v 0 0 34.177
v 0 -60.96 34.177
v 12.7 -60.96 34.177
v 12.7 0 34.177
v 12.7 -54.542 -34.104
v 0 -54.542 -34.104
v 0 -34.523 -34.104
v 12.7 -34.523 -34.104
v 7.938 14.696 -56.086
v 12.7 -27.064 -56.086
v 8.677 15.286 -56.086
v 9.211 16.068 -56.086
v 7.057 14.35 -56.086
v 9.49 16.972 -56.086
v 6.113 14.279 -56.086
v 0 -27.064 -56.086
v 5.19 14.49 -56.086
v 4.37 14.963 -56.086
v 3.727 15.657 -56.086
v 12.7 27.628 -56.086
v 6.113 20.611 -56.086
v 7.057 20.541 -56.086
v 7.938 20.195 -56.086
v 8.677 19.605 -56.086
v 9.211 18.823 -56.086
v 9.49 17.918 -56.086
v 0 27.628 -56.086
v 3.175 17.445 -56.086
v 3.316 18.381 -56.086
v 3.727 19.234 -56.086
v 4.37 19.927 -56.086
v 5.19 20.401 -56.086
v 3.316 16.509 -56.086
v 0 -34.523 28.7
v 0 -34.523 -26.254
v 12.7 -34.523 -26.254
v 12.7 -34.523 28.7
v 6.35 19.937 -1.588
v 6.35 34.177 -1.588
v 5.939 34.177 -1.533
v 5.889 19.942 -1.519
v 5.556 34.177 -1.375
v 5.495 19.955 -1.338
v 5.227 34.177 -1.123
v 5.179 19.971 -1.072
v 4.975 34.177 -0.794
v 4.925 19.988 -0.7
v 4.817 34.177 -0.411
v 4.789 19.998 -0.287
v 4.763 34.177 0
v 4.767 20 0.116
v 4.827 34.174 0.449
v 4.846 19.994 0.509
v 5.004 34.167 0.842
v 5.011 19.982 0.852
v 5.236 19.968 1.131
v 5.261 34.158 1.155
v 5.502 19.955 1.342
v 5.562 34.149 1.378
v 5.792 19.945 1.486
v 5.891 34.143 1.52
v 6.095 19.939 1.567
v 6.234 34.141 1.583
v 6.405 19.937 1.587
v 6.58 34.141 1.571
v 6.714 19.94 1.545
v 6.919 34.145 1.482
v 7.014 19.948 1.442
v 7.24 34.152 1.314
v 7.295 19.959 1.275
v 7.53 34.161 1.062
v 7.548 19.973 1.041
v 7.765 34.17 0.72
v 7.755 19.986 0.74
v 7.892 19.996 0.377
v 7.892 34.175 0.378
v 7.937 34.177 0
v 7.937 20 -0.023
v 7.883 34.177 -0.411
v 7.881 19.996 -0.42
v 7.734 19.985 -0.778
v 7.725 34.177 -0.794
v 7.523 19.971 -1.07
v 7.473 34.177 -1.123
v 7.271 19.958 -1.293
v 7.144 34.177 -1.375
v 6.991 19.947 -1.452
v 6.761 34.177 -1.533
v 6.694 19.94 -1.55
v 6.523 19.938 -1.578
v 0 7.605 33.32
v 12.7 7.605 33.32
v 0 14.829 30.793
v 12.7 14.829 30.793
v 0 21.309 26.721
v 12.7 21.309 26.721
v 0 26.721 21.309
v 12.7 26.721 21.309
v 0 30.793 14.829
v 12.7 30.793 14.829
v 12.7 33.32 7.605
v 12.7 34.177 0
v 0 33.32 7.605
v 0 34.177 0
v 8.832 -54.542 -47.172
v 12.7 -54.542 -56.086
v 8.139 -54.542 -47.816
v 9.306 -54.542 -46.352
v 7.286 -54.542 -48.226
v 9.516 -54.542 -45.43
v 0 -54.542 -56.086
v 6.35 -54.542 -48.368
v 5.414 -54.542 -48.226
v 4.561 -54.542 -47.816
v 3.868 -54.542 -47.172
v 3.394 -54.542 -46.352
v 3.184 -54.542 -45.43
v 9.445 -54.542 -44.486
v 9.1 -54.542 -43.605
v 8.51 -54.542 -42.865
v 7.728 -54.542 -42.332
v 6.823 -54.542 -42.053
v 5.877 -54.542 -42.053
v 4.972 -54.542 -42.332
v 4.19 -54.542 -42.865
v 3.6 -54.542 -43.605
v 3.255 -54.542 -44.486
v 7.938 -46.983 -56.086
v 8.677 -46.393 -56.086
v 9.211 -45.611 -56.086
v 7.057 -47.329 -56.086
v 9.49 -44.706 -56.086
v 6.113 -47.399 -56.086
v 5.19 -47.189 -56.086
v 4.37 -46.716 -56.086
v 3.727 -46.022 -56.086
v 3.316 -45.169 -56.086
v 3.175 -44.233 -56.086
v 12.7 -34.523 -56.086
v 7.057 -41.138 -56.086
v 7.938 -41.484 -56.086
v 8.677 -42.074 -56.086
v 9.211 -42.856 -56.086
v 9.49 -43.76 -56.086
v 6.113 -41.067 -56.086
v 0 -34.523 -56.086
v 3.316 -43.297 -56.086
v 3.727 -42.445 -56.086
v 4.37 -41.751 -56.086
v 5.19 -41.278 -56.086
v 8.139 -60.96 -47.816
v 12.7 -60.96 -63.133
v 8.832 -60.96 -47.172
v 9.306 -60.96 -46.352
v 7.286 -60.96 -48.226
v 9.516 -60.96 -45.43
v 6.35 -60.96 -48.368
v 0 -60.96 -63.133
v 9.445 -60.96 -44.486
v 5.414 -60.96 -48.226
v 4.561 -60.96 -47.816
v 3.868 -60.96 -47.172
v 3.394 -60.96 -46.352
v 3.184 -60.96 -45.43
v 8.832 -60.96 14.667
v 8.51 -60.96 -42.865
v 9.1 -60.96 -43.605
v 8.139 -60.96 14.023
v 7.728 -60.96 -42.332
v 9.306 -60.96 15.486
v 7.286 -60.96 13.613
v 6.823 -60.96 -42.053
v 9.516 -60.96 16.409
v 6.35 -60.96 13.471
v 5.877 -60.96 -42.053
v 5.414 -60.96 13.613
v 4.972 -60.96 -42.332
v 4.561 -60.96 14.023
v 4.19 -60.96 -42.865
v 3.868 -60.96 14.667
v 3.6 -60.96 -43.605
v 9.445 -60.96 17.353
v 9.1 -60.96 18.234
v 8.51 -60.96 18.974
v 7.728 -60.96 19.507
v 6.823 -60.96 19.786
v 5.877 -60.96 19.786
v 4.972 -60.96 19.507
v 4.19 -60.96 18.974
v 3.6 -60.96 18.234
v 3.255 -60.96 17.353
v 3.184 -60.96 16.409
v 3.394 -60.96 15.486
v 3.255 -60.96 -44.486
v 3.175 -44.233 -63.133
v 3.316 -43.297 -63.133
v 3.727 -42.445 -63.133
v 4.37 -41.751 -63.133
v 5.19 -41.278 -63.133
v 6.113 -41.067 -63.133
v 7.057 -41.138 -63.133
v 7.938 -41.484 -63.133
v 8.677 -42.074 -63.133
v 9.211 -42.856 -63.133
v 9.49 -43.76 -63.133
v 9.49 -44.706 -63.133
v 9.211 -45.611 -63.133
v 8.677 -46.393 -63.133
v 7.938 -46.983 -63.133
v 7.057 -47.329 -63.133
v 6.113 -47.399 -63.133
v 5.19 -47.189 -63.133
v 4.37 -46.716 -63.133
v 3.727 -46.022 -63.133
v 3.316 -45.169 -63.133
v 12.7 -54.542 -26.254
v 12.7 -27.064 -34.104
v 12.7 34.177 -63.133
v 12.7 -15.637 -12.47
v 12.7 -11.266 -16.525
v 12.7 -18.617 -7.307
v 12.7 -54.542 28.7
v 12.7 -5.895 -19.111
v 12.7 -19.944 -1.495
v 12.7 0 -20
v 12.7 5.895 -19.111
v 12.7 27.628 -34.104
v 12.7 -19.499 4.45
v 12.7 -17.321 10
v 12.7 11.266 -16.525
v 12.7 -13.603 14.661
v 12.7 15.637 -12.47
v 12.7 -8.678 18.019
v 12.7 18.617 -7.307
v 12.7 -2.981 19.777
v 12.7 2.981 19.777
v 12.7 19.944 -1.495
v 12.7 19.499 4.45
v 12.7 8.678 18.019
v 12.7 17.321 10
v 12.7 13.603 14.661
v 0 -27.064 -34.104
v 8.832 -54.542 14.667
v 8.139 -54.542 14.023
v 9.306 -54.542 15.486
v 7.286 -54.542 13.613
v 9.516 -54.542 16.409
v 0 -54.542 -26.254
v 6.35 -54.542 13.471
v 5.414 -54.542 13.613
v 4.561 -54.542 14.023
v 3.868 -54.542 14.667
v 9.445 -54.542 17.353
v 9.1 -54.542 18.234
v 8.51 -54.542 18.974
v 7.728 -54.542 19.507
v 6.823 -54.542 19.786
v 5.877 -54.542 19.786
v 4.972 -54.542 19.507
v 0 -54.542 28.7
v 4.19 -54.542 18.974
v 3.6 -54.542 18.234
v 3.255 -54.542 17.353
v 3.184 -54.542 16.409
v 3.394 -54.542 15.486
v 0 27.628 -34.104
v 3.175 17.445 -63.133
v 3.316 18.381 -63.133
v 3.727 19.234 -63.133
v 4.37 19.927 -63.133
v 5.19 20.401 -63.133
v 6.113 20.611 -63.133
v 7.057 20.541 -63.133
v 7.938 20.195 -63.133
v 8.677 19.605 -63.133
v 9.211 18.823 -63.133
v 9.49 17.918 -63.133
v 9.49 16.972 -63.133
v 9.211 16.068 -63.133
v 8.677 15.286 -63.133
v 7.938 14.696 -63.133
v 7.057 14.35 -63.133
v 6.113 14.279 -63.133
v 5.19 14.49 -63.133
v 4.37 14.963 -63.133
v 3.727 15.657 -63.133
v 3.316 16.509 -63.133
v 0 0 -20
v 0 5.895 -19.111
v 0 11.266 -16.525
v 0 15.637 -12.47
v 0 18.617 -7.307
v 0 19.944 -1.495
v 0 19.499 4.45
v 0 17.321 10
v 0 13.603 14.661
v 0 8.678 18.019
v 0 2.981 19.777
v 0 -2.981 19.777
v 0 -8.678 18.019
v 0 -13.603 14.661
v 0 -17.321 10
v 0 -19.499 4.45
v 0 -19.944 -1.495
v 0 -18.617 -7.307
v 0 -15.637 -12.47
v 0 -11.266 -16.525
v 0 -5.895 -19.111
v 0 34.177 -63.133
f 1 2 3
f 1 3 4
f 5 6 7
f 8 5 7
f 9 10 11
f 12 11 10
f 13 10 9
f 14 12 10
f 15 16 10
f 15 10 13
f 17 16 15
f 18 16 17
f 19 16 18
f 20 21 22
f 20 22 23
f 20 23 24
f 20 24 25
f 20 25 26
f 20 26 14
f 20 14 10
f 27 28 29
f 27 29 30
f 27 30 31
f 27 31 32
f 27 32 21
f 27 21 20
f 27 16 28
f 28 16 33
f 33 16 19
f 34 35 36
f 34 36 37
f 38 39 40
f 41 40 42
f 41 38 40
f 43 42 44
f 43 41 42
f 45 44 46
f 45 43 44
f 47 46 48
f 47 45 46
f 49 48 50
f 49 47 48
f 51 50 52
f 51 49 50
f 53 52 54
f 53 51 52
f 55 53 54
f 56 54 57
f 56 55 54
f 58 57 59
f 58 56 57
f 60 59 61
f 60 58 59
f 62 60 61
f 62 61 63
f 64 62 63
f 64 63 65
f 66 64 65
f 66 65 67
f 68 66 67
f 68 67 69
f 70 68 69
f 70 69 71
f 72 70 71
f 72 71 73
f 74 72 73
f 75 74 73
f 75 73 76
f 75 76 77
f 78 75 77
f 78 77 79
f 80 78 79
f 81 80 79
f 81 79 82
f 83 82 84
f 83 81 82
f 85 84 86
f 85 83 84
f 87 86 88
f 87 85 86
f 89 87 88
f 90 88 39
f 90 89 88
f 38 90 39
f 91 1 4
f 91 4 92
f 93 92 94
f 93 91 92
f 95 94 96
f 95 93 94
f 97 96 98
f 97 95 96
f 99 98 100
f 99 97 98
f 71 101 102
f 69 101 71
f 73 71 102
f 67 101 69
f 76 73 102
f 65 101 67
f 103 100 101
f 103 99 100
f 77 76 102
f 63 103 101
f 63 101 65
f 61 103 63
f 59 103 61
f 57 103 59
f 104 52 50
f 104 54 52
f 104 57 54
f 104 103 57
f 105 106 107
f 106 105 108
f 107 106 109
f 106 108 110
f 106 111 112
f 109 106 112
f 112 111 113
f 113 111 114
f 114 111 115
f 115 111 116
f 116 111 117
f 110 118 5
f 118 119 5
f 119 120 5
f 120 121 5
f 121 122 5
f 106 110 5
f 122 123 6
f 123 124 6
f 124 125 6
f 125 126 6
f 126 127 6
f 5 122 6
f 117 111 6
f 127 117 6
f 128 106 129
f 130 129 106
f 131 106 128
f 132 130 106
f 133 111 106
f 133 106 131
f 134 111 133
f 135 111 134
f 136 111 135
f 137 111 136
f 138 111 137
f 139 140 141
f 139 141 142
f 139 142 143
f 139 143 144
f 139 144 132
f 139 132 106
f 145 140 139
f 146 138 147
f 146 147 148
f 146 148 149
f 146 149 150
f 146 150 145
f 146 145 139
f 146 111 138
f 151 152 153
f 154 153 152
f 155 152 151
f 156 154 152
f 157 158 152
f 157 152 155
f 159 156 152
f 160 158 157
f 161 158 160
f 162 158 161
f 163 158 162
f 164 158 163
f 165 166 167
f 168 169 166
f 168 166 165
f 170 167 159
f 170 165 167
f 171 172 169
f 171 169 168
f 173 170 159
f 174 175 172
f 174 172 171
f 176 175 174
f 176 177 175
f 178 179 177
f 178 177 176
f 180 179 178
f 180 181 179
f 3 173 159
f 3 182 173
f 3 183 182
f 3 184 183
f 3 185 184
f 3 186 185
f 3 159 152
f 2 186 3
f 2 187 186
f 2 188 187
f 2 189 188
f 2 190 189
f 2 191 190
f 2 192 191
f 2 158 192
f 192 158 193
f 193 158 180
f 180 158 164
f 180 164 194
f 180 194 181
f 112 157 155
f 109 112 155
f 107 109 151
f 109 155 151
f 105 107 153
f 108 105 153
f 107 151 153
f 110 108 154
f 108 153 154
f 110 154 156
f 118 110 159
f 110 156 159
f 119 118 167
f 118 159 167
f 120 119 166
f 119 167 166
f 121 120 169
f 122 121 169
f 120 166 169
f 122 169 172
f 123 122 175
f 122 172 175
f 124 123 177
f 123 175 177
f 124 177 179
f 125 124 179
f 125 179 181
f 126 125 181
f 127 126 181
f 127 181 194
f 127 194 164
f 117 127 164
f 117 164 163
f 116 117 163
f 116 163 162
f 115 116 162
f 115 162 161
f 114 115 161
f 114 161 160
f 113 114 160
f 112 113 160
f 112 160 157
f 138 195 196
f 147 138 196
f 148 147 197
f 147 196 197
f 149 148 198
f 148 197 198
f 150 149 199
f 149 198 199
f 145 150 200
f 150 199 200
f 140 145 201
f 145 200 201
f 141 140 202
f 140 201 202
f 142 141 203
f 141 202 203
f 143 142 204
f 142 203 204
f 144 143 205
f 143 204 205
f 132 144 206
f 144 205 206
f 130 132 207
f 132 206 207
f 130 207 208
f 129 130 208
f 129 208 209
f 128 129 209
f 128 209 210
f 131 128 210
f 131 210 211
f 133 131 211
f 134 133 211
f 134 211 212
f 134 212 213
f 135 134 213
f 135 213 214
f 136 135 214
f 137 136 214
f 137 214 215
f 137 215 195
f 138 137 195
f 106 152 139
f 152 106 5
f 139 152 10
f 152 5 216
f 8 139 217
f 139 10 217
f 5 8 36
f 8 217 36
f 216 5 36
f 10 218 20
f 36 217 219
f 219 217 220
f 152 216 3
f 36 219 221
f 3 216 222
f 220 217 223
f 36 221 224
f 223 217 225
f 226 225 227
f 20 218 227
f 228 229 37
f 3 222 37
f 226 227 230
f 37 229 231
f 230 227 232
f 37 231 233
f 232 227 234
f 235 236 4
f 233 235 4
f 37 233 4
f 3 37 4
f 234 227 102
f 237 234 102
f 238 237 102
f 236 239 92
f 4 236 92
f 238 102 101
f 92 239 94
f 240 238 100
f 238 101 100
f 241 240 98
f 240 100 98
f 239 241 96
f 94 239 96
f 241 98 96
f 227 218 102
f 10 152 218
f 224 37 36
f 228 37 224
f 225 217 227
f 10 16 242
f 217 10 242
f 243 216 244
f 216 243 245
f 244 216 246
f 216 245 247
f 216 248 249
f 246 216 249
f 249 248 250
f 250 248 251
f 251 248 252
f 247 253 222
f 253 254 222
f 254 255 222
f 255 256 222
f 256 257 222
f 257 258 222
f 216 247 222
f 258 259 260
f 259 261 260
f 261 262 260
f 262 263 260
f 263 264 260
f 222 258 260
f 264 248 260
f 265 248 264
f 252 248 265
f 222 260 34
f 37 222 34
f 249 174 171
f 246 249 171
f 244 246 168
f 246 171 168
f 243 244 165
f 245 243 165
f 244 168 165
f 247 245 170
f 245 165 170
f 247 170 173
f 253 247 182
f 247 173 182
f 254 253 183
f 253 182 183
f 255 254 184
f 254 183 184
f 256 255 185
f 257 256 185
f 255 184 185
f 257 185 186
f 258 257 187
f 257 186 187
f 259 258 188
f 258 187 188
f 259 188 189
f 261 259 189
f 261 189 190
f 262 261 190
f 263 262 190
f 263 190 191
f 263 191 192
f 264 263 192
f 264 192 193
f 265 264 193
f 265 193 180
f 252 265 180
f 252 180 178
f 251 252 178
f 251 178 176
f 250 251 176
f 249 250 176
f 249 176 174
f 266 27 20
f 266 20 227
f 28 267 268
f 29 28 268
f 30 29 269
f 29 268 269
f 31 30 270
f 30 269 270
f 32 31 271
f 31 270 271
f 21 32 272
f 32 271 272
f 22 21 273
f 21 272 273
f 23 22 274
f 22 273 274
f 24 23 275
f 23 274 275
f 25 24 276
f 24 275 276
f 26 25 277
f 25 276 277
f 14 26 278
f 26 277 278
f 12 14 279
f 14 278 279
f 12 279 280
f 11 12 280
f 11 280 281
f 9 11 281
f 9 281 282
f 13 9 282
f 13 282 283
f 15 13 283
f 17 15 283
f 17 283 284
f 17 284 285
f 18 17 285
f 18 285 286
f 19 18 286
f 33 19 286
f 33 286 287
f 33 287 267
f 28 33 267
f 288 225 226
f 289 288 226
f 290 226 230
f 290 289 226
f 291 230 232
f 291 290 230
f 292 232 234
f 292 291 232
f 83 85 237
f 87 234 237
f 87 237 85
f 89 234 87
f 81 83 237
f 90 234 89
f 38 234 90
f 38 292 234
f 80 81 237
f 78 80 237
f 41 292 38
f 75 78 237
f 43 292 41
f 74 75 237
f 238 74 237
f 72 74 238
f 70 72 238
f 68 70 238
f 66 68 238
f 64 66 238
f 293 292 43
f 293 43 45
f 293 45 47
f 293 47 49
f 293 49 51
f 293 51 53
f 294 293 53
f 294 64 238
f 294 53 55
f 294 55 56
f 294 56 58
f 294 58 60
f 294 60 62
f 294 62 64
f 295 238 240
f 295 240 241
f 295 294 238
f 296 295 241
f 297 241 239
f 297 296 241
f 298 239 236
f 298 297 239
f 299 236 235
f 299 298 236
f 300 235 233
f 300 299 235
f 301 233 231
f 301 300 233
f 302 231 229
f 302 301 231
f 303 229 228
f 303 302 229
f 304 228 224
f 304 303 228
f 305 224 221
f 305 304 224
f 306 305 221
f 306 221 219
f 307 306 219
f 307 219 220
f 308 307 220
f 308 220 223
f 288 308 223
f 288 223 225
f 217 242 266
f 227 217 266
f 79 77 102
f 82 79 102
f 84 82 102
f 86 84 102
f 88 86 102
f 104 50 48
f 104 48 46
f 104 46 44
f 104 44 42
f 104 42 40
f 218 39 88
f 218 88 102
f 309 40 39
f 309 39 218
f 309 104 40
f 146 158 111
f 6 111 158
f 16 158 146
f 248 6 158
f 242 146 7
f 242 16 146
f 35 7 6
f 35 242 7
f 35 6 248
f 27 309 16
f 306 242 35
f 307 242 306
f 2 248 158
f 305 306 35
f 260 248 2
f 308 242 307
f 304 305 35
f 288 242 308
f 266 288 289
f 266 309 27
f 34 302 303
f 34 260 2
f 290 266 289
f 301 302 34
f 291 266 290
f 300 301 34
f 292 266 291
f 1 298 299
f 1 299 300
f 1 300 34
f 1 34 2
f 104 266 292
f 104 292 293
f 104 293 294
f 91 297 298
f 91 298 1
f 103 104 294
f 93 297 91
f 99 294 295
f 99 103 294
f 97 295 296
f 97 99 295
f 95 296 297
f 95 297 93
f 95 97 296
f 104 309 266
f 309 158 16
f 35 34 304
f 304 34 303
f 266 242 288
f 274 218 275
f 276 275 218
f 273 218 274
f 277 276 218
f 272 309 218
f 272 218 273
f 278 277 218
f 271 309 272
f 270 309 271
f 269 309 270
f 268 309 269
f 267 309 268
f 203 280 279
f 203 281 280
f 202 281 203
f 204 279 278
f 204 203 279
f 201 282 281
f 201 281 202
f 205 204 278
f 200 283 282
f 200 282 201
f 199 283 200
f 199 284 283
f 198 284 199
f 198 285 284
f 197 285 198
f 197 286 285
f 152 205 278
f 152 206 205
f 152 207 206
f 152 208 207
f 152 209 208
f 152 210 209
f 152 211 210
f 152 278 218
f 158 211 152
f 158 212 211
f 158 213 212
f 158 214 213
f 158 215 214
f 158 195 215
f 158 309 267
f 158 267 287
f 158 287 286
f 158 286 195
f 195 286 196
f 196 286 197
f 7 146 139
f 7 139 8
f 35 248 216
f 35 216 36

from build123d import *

# Parameters (mm, degrees)
SKETCH1_R           = 20
BOSS_EXTRUDE1_DEPTH = 12.7
SKETCH2_R           = 1.5875
CUT_EXTRUDE1_DEPTH  = 89.674827911
SKETCH3_W           = 21.981677087
SKETCH3_H           = 54.692506085
SKETCH3_W_2         = 54.954192717
SKETCH3_H_2         = 20.019027347
CUT_EXTRUDE2_DEPTH  = 70.866
SKETCH4_R           = 3.175
CUT_EXTRUDE3_DEPTH  = 13.462
SKETCH5_R           = 3.175
CUT_EXTRUDE4_DEPTH  = 13.462


with BuildPart() as part:
    # Sketch1 → Boss-Extrude1 (new body)
    with BuildSketch(Plane(origin=(0, 0, 0), x_dir=(0, 0, -1), z_dir=(1, 0, 0))):
        with BuildLine():
            Line((0, 34.177299494), (34.177299494, 34.177299494))
            Line((34.177299494, 34.177299494), (63.133299494, 34.177299494))
            Line((63.133299494, 34.177299494), (63.133299494, -60.96))
            Line((63.133299494, -60.96), (-34.177299494, -60.96))
            Line((-34.177299494, -60.96), (-34.177299494, 0))
            ThreePointArc((-34.177299494, 0), (-24.167000235, 24.167000235), (0, 34.177299494))
        make_face()
        Circle(SKETCH1_R, mode=Mode.SUBTRACT)
    extrude(amount=BOSS_EXTRUDE1_DEPTH)

    # Sketch2 → Cut-Extrude1 (cut, through all)
    with BuildSketch(Plane(origin=(0, 0, 0), x_dir=(1, 0, 0), z_dir=(0, 1, 0))):
        with Locations(Location((6.35, 0, 0), (0, 0, 90))):
            Circle(SKETCH2_R)
    extrude(amount=CUT_EXTRUDE1_DEPTH, mode=Mode.SUBTRACT)

    # Sketch3 → Cut-Extrude2 (cut)
    with BuildSketch(Plane.ZY):
        with Locations((-45.095335943, 0.281776268)):
            Rectangle(SKETCH3_W, SKETCH3_H)
        with Locations((1.22319792, -44.53205946)):
            Rectangle(SKETCH3_W_2, SKETCH3_H_2)
        with Locations((-45.095335943, -44.53205946)):
            Rectangle(SKETCH3_W, SKETCH3_H_2)
    extrude(amount=-CUT_EXTRUDE2_DEPTH, mode=Mode.SUBTRACT)

    # Sketch4 → Cut-Extrude3 (cut)
    with BuildSketch(Plane.XZ.offset(60.96)):
        with Locations(Location((6.35, 16.646444295, 0), (0, 0, 270))):
            Circle(SKETCH4_R)
        with Locations(Location((6.35, -45.192507654, 0), (0, 0, 270))):
            Circle(SKETCH4_R)
    extrude(amount=-CUT_EXTRUDE3_DEPTH, mode=Mode.SUBTRACT)

    # Sketch5 → Cut-Extrude4 (cut)
    with BuildSketch(Plane(origin=(0, 0, -63.133299494), x_dir=(-1, 0, 0), z_dir=(0, 0, -1))):
        with Locations((-6.35, 17.445139987)):
            Circle(SKETCH5_R)
        with Locations((-6.35, -44.233190942)):
            Circle(SKETCH5_R)
    extrude(amount=-CUT_EXTRUDE4_DEPTH, mode=Mode.SUBTRACT)


solid = part.part
